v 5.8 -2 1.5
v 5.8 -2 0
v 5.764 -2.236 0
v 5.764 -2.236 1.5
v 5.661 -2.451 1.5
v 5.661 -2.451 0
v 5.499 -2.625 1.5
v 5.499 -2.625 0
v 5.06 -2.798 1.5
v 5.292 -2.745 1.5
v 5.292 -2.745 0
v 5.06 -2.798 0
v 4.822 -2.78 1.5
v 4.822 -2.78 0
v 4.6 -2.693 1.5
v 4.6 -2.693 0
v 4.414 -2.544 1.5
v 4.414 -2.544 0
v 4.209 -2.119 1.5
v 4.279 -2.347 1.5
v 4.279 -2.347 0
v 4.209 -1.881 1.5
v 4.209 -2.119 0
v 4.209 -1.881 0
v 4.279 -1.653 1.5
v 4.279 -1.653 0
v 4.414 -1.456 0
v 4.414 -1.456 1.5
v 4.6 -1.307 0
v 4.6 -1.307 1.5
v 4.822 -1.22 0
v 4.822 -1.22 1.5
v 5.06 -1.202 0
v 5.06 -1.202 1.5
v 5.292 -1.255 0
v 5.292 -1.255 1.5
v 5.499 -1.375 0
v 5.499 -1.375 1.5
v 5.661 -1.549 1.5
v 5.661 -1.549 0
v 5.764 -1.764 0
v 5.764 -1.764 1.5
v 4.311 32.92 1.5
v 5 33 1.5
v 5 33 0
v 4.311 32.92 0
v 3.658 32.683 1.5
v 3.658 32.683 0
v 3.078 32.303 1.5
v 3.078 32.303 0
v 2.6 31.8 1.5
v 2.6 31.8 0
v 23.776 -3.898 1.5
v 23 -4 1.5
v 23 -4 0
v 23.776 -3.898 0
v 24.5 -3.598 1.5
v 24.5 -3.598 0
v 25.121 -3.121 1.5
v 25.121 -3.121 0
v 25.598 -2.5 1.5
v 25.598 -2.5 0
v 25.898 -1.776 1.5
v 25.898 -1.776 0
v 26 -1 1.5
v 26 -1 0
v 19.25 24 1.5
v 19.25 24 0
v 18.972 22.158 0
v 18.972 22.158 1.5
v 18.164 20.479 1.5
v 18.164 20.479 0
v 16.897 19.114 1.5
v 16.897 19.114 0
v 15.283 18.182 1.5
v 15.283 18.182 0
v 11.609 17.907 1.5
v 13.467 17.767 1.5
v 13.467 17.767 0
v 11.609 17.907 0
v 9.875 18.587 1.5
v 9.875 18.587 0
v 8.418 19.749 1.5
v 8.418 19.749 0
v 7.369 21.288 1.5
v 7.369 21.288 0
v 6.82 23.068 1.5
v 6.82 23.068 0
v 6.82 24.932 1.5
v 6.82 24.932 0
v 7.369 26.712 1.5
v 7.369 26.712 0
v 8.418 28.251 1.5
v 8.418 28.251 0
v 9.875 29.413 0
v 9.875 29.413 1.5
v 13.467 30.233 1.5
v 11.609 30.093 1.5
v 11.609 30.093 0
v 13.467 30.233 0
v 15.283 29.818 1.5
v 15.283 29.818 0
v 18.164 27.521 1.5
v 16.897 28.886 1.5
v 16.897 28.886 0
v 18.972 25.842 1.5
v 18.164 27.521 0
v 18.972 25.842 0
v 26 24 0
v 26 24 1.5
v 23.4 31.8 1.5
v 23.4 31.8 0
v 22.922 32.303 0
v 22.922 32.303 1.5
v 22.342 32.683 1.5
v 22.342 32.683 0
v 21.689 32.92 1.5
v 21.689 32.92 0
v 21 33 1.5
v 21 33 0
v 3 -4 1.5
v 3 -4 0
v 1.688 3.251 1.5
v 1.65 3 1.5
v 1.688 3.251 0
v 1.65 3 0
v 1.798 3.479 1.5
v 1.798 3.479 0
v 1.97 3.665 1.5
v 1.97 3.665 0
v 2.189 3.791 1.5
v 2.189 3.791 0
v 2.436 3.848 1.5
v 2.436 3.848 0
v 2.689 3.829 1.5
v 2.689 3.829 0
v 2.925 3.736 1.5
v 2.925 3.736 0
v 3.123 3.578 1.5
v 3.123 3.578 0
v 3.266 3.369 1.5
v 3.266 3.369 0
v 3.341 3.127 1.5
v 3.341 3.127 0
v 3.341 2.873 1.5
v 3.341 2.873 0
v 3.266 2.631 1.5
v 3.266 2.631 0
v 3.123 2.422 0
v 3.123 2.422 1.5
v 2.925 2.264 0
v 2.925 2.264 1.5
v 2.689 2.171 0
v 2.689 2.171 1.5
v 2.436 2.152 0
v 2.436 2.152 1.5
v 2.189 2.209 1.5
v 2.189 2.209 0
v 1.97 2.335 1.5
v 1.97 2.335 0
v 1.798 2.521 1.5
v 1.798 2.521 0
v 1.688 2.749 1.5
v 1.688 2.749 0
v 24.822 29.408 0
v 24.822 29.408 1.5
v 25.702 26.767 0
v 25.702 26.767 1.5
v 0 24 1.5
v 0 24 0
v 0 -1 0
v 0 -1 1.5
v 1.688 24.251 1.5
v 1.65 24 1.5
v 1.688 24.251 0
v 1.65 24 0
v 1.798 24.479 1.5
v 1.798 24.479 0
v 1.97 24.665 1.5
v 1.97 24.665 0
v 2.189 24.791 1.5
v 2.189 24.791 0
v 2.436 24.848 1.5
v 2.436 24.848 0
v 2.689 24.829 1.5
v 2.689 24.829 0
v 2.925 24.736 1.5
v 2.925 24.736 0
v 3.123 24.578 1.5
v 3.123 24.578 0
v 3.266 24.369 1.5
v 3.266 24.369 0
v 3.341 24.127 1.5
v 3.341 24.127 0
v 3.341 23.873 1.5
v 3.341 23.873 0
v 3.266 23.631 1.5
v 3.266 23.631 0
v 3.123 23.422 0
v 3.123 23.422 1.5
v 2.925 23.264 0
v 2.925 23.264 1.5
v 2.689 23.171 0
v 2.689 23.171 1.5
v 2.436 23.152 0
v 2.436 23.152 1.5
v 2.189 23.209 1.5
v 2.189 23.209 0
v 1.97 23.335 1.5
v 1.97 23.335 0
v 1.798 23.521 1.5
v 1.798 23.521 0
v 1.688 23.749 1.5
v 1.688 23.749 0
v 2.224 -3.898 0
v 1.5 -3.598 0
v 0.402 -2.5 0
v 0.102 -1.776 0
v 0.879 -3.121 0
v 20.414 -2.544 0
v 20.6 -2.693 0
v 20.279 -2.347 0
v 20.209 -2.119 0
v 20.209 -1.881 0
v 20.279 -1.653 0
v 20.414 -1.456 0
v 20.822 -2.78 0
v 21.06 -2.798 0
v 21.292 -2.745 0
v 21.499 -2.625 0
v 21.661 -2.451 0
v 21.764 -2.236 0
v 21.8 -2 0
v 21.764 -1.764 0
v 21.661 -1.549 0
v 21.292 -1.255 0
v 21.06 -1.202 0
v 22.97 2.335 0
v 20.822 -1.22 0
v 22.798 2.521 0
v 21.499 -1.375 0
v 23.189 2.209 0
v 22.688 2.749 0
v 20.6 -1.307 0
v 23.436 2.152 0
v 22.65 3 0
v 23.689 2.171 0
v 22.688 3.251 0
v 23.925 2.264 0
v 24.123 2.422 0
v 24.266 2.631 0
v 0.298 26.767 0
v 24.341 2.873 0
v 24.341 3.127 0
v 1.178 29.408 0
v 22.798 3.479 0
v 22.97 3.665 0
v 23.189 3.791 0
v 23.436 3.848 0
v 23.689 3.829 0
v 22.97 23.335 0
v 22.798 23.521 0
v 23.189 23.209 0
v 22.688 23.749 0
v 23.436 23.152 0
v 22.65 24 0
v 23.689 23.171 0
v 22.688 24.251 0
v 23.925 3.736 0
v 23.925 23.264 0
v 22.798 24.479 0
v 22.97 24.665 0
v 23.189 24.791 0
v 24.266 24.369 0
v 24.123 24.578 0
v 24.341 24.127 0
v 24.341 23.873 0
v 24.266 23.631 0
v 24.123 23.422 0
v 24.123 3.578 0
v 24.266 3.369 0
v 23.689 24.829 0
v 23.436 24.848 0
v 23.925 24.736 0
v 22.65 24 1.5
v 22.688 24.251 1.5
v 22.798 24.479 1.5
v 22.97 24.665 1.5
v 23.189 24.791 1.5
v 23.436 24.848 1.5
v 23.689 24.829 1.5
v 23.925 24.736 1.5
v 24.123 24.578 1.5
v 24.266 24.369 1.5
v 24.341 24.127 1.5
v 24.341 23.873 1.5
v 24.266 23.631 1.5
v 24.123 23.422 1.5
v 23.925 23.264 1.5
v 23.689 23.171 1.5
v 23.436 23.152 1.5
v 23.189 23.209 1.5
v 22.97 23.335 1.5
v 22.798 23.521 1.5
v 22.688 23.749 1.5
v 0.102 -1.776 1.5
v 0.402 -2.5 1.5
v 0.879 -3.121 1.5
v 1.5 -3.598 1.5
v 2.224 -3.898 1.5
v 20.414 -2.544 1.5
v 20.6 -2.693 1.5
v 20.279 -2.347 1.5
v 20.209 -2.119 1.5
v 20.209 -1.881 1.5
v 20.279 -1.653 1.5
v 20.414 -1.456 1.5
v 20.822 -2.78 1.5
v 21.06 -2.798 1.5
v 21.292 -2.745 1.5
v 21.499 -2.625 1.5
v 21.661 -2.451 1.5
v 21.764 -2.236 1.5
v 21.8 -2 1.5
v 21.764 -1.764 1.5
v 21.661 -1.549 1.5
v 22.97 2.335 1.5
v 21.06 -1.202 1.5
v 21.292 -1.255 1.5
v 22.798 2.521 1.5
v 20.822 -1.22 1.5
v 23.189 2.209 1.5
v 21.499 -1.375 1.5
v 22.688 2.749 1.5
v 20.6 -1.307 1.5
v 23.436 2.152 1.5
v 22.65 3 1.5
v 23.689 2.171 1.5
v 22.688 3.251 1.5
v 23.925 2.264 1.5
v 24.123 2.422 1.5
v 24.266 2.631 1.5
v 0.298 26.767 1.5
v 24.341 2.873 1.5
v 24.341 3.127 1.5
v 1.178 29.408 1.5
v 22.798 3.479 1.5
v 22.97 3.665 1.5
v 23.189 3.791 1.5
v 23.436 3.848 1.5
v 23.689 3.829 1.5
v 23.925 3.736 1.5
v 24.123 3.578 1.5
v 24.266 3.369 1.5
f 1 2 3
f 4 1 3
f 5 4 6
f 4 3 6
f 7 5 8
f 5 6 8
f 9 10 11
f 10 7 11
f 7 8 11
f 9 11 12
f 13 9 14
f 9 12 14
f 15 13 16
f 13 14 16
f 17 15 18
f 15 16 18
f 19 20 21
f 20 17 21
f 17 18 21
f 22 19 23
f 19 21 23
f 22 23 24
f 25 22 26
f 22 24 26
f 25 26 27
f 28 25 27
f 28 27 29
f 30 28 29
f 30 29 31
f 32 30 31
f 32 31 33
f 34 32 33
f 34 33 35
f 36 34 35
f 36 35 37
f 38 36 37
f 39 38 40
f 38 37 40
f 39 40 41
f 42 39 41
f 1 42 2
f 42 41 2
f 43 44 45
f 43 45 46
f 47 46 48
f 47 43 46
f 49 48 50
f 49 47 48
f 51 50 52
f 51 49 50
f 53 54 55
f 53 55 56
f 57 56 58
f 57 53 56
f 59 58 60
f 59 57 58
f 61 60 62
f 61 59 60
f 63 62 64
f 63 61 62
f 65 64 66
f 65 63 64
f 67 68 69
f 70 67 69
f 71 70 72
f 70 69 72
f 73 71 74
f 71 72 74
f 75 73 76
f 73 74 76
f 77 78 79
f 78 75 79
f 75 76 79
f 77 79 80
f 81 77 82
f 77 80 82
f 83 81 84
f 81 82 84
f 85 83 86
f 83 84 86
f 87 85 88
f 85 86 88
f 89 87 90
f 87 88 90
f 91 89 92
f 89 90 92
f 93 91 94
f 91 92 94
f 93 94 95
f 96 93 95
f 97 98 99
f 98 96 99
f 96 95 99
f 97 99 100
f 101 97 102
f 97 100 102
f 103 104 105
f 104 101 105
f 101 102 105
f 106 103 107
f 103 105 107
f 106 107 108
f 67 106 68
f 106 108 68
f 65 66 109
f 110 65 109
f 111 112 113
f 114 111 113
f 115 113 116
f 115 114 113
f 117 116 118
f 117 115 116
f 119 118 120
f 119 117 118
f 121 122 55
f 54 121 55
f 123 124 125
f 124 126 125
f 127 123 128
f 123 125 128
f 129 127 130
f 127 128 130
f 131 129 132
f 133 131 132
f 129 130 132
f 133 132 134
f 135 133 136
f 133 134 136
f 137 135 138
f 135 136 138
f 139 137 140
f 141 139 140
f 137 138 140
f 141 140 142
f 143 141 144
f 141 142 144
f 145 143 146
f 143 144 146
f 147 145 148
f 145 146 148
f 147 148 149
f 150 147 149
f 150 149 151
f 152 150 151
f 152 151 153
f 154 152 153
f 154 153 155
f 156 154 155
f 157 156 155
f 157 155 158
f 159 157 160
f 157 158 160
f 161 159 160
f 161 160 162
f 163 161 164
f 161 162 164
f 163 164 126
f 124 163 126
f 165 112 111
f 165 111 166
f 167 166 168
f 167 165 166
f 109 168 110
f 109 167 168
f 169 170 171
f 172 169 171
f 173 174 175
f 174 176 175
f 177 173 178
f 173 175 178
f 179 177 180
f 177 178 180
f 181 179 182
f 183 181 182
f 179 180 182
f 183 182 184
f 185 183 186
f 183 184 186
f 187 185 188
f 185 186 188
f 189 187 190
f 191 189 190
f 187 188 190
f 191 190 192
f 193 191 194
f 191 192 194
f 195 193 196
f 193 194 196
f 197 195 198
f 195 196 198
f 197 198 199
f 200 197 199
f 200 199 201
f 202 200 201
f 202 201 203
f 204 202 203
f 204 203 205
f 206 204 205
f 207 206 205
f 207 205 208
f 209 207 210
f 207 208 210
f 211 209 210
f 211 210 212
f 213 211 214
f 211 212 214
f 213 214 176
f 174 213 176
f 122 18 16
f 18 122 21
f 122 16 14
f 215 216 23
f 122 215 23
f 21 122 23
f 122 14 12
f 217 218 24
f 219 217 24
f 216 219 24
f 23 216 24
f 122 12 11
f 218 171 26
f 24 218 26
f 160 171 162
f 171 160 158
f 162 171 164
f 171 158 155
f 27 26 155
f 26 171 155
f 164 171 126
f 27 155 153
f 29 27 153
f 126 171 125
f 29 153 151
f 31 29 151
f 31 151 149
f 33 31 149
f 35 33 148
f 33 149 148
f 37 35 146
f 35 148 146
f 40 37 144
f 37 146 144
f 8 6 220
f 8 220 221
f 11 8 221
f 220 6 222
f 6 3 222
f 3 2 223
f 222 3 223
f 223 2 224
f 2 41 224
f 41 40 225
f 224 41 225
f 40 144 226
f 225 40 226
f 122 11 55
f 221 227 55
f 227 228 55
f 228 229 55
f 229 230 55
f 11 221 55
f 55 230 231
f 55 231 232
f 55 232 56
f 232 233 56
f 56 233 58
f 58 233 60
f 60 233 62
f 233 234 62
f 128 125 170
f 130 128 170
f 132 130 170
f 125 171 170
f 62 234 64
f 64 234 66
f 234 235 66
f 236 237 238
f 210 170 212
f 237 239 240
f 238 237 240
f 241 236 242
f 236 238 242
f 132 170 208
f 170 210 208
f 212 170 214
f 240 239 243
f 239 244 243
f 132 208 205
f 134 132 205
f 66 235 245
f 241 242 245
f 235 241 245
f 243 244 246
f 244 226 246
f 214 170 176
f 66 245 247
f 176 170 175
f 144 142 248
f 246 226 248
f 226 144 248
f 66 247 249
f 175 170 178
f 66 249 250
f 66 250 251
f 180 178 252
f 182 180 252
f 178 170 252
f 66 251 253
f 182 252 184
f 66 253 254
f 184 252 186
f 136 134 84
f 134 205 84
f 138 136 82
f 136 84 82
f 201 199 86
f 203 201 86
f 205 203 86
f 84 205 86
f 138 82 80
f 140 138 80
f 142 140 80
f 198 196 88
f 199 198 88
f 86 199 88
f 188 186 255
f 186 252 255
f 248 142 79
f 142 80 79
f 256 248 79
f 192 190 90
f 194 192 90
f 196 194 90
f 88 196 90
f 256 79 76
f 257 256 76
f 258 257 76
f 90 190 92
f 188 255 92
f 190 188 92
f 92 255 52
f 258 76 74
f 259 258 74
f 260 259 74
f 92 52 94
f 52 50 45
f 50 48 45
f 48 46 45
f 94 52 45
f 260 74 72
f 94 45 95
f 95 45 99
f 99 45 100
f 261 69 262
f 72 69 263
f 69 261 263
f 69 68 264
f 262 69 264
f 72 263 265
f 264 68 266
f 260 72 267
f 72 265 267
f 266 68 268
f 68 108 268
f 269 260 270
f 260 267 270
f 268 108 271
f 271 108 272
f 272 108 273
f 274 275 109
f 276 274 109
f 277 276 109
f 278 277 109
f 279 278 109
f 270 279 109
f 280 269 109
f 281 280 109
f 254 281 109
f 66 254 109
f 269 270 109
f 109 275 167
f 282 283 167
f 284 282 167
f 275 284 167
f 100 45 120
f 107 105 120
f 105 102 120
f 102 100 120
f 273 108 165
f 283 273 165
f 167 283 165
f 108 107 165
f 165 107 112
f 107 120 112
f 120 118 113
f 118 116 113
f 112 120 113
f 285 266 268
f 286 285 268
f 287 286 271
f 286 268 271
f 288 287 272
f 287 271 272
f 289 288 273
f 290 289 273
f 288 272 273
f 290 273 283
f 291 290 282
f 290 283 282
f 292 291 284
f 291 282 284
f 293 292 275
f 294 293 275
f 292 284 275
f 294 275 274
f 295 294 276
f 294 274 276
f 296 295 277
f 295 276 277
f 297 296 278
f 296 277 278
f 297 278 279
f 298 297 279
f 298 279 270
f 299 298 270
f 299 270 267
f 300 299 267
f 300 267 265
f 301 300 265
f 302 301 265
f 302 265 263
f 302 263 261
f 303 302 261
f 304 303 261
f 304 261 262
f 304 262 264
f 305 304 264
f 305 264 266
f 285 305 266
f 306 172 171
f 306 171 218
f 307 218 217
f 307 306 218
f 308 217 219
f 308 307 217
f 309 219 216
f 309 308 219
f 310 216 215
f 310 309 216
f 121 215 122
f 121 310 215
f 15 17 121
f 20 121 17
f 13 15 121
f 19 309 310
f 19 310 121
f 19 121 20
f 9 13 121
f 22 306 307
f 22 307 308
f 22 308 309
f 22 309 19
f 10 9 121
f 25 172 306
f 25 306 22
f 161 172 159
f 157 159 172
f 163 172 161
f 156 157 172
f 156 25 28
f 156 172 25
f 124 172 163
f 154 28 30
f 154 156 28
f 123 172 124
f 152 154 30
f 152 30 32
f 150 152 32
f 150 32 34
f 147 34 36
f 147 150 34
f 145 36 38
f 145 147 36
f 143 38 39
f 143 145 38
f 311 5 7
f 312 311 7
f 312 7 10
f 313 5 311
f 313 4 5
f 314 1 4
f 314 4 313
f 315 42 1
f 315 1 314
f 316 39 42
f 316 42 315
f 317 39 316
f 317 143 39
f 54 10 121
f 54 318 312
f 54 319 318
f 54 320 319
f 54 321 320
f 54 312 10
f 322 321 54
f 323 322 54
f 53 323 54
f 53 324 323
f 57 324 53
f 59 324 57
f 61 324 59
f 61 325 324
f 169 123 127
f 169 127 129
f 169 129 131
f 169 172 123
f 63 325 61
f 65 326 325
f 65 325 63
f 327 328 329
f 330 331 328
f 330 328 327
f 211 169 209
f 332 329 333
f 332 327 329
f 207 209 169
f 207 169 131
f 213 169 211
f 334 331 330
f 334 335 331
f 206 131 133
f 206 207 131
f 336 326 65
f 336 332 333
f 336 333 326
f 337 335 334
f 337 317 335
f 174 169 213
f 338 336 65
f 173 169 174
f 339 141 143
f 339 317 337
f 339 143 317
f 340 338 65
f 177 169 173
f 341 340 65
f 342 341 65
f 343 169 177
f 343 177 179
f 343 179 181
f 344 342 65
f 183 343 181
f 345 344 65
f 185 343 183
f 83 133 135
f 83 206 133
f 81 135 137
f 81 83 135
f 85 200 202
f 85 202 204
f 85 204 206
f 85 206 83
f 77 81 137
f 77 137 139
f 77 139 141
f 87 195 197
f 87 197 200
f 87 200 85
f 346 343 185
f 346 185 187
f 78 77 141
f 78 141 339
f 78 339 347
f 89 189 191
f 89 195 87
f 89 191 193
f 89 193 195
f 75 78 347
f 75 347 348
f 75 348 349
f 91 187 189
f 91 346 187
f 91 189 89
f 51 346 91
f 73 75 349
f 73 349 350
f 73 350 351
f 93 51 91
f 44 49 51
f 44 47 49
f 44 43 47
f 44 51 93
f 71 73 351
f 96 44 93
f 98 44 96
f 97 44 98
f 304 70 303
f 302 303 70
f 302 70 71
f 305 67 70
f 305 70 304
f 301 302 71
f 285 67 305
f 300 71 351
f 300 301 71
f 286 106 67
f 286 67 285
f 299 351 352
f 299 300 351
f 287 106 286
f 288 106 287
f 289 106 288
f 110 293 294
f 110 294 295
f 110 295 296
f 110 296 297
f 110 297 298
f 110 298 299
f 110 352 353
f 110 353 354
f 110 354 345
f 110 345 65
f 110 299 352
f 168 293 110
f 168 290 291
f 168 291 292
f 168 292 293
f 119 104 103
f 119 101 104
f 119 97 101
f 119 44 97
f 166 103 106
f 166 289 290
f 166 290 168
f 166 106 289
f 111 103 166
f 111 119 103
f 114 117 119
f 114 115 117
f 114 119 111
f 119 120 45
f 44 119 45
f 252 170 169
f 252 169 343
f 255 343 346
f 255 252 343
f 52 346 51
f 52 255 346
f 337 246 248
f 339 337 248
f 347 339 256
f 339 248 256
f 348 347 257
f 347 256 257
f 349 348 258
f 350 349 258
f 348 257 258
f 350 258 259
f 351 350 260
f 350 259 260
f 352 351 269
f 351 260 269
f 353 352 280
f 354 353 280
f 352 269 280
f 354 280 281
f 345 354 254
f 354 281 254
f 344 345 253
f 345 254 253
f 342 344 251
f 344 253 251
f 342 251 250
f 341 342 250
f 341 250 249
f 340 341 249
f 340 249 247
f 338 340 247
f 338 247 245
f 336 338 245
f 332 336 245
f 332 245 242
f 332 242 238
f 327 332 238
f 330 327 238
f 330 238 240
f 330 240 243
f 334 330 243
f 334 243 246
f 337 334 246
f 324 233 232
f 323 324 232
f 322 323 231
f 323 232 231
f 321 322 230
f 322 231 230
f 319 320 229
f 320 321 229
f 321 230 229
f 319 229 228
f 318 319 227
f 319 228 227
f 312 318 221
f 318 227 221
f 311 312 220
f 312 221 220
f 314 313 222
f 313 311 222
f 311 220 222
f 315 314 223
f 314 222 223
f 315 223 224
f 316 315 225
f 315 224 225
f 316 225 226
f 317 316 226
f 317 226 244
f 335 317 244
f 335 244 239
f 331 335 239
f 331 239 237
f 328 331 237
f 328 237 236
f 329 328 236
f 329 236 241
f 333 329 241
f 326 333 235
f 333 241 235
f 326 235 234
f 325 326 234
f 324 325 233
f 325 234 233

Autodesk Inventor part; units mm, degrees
ref_plane "YZ Plane" through (0, 0, 0) normal (1, 0, 0) x (0, 1, 0)
ref_plane "XZ Plane" through (0, 0, 0) normal (0, 1, 0) x (-1, 0, 0)
ref_plane "XY Plane" through (0, 0, 0) normal (0, 0, 1) x (1, 0, 0)
sketch "スケッチ2" plane through (0, 0, 0) normal (0, 0, 1) x (1, 0, 0)
  line L0 (0, 0) -> (26, 0)
  line L1 (26, 0) -> (26, 33)
  line L2 (26, 33) -> (0, 33)
  line L3 (0, 33) -> (0, 0)
  line L4 (0, 0) -> (26, 0)
  line L5 (26, 0) -> (26, 24)
  line L6 (26, 24) -> (0, 24) construction
  line L7 (0, 24) -> (0, 0)
  circle A0 centre (13, 24) radius 13
  circle A1 centre (13, 24) radius 6.25
  line L8 (26, 0) -> (0, 0)
  line L9 (0, 0) -> (0, -4)
  line L10 (0, -4) -> (26, -4)
  line L11 (26, -4) -> (26, 0)
  circle A2 centre (21, -2) radius 0.8
  circle A3 centre (5, -2) radius 0.8
  point P0 (22.3808, 33)
  point P1 (3.6192, 33)
  point P2 (26, -2)
  dimension "d0" = 26
  dimension "d1" = 33
  dimension "d2" = 24
  dimension "d3" = 12.5
  dimension "d8" = 4
  dimension "d9" = 1.6
  dimension "d10" = 1.6
  dimension "d12" = 5
  dimension "d13" = 5
extrude "押し出し1" add sketch "スケッチ2" along normal blind 1.5 contours L3 A0 L1 L0 | L0 L11 L10 L9 | A0 L2 picked at (12.7489, 32.0681)
sketch "スケッチ3" plane through (0, 0, 0) normal (0, 0, -1) x (-1, 0, 0)
  circle A0 centre (-2.5, 24) radius 0.85 projected
  circle A1 centre (-23.5, 24) radius 0.85 projected
  circle A2 centre (-23.5, 3) radius 0.85 projected
  circle A3 centre (-2.5, 3) radius 0.85 projected
  point P0 (0, 0)
extrude "押し出し2" cut sketch "スケッチ3" against normal through all
fillet "フィレット1" radius 3 4 edges at (22.3808, 33, 0.75) (3.6192, 33, 0.75) (26, -4, 0.75) (0, -4, 0.75)
equation "\"d13\" = d12"
equation "\"BendRadius\" = Thickness"
equation "\"BendReliefWidth\" = Thickness"
equation "\"BendReliefDepth\" = 0.5 * Thickness"
equation "\"CornerReliefSize\" = 4 * Thickness"
equation "\"MinimumRemnant\" = 2 * Thickness"
equation "\"TransitionRadius\" = BendRadius"
equation "\"JacobiRadiusSize\" = BendRadius"
equation "\"GapSize\" = Thickness"
equation "\"Thickness\" = 3.048"
properties part number "arm" material "アルミニウム 6061"
